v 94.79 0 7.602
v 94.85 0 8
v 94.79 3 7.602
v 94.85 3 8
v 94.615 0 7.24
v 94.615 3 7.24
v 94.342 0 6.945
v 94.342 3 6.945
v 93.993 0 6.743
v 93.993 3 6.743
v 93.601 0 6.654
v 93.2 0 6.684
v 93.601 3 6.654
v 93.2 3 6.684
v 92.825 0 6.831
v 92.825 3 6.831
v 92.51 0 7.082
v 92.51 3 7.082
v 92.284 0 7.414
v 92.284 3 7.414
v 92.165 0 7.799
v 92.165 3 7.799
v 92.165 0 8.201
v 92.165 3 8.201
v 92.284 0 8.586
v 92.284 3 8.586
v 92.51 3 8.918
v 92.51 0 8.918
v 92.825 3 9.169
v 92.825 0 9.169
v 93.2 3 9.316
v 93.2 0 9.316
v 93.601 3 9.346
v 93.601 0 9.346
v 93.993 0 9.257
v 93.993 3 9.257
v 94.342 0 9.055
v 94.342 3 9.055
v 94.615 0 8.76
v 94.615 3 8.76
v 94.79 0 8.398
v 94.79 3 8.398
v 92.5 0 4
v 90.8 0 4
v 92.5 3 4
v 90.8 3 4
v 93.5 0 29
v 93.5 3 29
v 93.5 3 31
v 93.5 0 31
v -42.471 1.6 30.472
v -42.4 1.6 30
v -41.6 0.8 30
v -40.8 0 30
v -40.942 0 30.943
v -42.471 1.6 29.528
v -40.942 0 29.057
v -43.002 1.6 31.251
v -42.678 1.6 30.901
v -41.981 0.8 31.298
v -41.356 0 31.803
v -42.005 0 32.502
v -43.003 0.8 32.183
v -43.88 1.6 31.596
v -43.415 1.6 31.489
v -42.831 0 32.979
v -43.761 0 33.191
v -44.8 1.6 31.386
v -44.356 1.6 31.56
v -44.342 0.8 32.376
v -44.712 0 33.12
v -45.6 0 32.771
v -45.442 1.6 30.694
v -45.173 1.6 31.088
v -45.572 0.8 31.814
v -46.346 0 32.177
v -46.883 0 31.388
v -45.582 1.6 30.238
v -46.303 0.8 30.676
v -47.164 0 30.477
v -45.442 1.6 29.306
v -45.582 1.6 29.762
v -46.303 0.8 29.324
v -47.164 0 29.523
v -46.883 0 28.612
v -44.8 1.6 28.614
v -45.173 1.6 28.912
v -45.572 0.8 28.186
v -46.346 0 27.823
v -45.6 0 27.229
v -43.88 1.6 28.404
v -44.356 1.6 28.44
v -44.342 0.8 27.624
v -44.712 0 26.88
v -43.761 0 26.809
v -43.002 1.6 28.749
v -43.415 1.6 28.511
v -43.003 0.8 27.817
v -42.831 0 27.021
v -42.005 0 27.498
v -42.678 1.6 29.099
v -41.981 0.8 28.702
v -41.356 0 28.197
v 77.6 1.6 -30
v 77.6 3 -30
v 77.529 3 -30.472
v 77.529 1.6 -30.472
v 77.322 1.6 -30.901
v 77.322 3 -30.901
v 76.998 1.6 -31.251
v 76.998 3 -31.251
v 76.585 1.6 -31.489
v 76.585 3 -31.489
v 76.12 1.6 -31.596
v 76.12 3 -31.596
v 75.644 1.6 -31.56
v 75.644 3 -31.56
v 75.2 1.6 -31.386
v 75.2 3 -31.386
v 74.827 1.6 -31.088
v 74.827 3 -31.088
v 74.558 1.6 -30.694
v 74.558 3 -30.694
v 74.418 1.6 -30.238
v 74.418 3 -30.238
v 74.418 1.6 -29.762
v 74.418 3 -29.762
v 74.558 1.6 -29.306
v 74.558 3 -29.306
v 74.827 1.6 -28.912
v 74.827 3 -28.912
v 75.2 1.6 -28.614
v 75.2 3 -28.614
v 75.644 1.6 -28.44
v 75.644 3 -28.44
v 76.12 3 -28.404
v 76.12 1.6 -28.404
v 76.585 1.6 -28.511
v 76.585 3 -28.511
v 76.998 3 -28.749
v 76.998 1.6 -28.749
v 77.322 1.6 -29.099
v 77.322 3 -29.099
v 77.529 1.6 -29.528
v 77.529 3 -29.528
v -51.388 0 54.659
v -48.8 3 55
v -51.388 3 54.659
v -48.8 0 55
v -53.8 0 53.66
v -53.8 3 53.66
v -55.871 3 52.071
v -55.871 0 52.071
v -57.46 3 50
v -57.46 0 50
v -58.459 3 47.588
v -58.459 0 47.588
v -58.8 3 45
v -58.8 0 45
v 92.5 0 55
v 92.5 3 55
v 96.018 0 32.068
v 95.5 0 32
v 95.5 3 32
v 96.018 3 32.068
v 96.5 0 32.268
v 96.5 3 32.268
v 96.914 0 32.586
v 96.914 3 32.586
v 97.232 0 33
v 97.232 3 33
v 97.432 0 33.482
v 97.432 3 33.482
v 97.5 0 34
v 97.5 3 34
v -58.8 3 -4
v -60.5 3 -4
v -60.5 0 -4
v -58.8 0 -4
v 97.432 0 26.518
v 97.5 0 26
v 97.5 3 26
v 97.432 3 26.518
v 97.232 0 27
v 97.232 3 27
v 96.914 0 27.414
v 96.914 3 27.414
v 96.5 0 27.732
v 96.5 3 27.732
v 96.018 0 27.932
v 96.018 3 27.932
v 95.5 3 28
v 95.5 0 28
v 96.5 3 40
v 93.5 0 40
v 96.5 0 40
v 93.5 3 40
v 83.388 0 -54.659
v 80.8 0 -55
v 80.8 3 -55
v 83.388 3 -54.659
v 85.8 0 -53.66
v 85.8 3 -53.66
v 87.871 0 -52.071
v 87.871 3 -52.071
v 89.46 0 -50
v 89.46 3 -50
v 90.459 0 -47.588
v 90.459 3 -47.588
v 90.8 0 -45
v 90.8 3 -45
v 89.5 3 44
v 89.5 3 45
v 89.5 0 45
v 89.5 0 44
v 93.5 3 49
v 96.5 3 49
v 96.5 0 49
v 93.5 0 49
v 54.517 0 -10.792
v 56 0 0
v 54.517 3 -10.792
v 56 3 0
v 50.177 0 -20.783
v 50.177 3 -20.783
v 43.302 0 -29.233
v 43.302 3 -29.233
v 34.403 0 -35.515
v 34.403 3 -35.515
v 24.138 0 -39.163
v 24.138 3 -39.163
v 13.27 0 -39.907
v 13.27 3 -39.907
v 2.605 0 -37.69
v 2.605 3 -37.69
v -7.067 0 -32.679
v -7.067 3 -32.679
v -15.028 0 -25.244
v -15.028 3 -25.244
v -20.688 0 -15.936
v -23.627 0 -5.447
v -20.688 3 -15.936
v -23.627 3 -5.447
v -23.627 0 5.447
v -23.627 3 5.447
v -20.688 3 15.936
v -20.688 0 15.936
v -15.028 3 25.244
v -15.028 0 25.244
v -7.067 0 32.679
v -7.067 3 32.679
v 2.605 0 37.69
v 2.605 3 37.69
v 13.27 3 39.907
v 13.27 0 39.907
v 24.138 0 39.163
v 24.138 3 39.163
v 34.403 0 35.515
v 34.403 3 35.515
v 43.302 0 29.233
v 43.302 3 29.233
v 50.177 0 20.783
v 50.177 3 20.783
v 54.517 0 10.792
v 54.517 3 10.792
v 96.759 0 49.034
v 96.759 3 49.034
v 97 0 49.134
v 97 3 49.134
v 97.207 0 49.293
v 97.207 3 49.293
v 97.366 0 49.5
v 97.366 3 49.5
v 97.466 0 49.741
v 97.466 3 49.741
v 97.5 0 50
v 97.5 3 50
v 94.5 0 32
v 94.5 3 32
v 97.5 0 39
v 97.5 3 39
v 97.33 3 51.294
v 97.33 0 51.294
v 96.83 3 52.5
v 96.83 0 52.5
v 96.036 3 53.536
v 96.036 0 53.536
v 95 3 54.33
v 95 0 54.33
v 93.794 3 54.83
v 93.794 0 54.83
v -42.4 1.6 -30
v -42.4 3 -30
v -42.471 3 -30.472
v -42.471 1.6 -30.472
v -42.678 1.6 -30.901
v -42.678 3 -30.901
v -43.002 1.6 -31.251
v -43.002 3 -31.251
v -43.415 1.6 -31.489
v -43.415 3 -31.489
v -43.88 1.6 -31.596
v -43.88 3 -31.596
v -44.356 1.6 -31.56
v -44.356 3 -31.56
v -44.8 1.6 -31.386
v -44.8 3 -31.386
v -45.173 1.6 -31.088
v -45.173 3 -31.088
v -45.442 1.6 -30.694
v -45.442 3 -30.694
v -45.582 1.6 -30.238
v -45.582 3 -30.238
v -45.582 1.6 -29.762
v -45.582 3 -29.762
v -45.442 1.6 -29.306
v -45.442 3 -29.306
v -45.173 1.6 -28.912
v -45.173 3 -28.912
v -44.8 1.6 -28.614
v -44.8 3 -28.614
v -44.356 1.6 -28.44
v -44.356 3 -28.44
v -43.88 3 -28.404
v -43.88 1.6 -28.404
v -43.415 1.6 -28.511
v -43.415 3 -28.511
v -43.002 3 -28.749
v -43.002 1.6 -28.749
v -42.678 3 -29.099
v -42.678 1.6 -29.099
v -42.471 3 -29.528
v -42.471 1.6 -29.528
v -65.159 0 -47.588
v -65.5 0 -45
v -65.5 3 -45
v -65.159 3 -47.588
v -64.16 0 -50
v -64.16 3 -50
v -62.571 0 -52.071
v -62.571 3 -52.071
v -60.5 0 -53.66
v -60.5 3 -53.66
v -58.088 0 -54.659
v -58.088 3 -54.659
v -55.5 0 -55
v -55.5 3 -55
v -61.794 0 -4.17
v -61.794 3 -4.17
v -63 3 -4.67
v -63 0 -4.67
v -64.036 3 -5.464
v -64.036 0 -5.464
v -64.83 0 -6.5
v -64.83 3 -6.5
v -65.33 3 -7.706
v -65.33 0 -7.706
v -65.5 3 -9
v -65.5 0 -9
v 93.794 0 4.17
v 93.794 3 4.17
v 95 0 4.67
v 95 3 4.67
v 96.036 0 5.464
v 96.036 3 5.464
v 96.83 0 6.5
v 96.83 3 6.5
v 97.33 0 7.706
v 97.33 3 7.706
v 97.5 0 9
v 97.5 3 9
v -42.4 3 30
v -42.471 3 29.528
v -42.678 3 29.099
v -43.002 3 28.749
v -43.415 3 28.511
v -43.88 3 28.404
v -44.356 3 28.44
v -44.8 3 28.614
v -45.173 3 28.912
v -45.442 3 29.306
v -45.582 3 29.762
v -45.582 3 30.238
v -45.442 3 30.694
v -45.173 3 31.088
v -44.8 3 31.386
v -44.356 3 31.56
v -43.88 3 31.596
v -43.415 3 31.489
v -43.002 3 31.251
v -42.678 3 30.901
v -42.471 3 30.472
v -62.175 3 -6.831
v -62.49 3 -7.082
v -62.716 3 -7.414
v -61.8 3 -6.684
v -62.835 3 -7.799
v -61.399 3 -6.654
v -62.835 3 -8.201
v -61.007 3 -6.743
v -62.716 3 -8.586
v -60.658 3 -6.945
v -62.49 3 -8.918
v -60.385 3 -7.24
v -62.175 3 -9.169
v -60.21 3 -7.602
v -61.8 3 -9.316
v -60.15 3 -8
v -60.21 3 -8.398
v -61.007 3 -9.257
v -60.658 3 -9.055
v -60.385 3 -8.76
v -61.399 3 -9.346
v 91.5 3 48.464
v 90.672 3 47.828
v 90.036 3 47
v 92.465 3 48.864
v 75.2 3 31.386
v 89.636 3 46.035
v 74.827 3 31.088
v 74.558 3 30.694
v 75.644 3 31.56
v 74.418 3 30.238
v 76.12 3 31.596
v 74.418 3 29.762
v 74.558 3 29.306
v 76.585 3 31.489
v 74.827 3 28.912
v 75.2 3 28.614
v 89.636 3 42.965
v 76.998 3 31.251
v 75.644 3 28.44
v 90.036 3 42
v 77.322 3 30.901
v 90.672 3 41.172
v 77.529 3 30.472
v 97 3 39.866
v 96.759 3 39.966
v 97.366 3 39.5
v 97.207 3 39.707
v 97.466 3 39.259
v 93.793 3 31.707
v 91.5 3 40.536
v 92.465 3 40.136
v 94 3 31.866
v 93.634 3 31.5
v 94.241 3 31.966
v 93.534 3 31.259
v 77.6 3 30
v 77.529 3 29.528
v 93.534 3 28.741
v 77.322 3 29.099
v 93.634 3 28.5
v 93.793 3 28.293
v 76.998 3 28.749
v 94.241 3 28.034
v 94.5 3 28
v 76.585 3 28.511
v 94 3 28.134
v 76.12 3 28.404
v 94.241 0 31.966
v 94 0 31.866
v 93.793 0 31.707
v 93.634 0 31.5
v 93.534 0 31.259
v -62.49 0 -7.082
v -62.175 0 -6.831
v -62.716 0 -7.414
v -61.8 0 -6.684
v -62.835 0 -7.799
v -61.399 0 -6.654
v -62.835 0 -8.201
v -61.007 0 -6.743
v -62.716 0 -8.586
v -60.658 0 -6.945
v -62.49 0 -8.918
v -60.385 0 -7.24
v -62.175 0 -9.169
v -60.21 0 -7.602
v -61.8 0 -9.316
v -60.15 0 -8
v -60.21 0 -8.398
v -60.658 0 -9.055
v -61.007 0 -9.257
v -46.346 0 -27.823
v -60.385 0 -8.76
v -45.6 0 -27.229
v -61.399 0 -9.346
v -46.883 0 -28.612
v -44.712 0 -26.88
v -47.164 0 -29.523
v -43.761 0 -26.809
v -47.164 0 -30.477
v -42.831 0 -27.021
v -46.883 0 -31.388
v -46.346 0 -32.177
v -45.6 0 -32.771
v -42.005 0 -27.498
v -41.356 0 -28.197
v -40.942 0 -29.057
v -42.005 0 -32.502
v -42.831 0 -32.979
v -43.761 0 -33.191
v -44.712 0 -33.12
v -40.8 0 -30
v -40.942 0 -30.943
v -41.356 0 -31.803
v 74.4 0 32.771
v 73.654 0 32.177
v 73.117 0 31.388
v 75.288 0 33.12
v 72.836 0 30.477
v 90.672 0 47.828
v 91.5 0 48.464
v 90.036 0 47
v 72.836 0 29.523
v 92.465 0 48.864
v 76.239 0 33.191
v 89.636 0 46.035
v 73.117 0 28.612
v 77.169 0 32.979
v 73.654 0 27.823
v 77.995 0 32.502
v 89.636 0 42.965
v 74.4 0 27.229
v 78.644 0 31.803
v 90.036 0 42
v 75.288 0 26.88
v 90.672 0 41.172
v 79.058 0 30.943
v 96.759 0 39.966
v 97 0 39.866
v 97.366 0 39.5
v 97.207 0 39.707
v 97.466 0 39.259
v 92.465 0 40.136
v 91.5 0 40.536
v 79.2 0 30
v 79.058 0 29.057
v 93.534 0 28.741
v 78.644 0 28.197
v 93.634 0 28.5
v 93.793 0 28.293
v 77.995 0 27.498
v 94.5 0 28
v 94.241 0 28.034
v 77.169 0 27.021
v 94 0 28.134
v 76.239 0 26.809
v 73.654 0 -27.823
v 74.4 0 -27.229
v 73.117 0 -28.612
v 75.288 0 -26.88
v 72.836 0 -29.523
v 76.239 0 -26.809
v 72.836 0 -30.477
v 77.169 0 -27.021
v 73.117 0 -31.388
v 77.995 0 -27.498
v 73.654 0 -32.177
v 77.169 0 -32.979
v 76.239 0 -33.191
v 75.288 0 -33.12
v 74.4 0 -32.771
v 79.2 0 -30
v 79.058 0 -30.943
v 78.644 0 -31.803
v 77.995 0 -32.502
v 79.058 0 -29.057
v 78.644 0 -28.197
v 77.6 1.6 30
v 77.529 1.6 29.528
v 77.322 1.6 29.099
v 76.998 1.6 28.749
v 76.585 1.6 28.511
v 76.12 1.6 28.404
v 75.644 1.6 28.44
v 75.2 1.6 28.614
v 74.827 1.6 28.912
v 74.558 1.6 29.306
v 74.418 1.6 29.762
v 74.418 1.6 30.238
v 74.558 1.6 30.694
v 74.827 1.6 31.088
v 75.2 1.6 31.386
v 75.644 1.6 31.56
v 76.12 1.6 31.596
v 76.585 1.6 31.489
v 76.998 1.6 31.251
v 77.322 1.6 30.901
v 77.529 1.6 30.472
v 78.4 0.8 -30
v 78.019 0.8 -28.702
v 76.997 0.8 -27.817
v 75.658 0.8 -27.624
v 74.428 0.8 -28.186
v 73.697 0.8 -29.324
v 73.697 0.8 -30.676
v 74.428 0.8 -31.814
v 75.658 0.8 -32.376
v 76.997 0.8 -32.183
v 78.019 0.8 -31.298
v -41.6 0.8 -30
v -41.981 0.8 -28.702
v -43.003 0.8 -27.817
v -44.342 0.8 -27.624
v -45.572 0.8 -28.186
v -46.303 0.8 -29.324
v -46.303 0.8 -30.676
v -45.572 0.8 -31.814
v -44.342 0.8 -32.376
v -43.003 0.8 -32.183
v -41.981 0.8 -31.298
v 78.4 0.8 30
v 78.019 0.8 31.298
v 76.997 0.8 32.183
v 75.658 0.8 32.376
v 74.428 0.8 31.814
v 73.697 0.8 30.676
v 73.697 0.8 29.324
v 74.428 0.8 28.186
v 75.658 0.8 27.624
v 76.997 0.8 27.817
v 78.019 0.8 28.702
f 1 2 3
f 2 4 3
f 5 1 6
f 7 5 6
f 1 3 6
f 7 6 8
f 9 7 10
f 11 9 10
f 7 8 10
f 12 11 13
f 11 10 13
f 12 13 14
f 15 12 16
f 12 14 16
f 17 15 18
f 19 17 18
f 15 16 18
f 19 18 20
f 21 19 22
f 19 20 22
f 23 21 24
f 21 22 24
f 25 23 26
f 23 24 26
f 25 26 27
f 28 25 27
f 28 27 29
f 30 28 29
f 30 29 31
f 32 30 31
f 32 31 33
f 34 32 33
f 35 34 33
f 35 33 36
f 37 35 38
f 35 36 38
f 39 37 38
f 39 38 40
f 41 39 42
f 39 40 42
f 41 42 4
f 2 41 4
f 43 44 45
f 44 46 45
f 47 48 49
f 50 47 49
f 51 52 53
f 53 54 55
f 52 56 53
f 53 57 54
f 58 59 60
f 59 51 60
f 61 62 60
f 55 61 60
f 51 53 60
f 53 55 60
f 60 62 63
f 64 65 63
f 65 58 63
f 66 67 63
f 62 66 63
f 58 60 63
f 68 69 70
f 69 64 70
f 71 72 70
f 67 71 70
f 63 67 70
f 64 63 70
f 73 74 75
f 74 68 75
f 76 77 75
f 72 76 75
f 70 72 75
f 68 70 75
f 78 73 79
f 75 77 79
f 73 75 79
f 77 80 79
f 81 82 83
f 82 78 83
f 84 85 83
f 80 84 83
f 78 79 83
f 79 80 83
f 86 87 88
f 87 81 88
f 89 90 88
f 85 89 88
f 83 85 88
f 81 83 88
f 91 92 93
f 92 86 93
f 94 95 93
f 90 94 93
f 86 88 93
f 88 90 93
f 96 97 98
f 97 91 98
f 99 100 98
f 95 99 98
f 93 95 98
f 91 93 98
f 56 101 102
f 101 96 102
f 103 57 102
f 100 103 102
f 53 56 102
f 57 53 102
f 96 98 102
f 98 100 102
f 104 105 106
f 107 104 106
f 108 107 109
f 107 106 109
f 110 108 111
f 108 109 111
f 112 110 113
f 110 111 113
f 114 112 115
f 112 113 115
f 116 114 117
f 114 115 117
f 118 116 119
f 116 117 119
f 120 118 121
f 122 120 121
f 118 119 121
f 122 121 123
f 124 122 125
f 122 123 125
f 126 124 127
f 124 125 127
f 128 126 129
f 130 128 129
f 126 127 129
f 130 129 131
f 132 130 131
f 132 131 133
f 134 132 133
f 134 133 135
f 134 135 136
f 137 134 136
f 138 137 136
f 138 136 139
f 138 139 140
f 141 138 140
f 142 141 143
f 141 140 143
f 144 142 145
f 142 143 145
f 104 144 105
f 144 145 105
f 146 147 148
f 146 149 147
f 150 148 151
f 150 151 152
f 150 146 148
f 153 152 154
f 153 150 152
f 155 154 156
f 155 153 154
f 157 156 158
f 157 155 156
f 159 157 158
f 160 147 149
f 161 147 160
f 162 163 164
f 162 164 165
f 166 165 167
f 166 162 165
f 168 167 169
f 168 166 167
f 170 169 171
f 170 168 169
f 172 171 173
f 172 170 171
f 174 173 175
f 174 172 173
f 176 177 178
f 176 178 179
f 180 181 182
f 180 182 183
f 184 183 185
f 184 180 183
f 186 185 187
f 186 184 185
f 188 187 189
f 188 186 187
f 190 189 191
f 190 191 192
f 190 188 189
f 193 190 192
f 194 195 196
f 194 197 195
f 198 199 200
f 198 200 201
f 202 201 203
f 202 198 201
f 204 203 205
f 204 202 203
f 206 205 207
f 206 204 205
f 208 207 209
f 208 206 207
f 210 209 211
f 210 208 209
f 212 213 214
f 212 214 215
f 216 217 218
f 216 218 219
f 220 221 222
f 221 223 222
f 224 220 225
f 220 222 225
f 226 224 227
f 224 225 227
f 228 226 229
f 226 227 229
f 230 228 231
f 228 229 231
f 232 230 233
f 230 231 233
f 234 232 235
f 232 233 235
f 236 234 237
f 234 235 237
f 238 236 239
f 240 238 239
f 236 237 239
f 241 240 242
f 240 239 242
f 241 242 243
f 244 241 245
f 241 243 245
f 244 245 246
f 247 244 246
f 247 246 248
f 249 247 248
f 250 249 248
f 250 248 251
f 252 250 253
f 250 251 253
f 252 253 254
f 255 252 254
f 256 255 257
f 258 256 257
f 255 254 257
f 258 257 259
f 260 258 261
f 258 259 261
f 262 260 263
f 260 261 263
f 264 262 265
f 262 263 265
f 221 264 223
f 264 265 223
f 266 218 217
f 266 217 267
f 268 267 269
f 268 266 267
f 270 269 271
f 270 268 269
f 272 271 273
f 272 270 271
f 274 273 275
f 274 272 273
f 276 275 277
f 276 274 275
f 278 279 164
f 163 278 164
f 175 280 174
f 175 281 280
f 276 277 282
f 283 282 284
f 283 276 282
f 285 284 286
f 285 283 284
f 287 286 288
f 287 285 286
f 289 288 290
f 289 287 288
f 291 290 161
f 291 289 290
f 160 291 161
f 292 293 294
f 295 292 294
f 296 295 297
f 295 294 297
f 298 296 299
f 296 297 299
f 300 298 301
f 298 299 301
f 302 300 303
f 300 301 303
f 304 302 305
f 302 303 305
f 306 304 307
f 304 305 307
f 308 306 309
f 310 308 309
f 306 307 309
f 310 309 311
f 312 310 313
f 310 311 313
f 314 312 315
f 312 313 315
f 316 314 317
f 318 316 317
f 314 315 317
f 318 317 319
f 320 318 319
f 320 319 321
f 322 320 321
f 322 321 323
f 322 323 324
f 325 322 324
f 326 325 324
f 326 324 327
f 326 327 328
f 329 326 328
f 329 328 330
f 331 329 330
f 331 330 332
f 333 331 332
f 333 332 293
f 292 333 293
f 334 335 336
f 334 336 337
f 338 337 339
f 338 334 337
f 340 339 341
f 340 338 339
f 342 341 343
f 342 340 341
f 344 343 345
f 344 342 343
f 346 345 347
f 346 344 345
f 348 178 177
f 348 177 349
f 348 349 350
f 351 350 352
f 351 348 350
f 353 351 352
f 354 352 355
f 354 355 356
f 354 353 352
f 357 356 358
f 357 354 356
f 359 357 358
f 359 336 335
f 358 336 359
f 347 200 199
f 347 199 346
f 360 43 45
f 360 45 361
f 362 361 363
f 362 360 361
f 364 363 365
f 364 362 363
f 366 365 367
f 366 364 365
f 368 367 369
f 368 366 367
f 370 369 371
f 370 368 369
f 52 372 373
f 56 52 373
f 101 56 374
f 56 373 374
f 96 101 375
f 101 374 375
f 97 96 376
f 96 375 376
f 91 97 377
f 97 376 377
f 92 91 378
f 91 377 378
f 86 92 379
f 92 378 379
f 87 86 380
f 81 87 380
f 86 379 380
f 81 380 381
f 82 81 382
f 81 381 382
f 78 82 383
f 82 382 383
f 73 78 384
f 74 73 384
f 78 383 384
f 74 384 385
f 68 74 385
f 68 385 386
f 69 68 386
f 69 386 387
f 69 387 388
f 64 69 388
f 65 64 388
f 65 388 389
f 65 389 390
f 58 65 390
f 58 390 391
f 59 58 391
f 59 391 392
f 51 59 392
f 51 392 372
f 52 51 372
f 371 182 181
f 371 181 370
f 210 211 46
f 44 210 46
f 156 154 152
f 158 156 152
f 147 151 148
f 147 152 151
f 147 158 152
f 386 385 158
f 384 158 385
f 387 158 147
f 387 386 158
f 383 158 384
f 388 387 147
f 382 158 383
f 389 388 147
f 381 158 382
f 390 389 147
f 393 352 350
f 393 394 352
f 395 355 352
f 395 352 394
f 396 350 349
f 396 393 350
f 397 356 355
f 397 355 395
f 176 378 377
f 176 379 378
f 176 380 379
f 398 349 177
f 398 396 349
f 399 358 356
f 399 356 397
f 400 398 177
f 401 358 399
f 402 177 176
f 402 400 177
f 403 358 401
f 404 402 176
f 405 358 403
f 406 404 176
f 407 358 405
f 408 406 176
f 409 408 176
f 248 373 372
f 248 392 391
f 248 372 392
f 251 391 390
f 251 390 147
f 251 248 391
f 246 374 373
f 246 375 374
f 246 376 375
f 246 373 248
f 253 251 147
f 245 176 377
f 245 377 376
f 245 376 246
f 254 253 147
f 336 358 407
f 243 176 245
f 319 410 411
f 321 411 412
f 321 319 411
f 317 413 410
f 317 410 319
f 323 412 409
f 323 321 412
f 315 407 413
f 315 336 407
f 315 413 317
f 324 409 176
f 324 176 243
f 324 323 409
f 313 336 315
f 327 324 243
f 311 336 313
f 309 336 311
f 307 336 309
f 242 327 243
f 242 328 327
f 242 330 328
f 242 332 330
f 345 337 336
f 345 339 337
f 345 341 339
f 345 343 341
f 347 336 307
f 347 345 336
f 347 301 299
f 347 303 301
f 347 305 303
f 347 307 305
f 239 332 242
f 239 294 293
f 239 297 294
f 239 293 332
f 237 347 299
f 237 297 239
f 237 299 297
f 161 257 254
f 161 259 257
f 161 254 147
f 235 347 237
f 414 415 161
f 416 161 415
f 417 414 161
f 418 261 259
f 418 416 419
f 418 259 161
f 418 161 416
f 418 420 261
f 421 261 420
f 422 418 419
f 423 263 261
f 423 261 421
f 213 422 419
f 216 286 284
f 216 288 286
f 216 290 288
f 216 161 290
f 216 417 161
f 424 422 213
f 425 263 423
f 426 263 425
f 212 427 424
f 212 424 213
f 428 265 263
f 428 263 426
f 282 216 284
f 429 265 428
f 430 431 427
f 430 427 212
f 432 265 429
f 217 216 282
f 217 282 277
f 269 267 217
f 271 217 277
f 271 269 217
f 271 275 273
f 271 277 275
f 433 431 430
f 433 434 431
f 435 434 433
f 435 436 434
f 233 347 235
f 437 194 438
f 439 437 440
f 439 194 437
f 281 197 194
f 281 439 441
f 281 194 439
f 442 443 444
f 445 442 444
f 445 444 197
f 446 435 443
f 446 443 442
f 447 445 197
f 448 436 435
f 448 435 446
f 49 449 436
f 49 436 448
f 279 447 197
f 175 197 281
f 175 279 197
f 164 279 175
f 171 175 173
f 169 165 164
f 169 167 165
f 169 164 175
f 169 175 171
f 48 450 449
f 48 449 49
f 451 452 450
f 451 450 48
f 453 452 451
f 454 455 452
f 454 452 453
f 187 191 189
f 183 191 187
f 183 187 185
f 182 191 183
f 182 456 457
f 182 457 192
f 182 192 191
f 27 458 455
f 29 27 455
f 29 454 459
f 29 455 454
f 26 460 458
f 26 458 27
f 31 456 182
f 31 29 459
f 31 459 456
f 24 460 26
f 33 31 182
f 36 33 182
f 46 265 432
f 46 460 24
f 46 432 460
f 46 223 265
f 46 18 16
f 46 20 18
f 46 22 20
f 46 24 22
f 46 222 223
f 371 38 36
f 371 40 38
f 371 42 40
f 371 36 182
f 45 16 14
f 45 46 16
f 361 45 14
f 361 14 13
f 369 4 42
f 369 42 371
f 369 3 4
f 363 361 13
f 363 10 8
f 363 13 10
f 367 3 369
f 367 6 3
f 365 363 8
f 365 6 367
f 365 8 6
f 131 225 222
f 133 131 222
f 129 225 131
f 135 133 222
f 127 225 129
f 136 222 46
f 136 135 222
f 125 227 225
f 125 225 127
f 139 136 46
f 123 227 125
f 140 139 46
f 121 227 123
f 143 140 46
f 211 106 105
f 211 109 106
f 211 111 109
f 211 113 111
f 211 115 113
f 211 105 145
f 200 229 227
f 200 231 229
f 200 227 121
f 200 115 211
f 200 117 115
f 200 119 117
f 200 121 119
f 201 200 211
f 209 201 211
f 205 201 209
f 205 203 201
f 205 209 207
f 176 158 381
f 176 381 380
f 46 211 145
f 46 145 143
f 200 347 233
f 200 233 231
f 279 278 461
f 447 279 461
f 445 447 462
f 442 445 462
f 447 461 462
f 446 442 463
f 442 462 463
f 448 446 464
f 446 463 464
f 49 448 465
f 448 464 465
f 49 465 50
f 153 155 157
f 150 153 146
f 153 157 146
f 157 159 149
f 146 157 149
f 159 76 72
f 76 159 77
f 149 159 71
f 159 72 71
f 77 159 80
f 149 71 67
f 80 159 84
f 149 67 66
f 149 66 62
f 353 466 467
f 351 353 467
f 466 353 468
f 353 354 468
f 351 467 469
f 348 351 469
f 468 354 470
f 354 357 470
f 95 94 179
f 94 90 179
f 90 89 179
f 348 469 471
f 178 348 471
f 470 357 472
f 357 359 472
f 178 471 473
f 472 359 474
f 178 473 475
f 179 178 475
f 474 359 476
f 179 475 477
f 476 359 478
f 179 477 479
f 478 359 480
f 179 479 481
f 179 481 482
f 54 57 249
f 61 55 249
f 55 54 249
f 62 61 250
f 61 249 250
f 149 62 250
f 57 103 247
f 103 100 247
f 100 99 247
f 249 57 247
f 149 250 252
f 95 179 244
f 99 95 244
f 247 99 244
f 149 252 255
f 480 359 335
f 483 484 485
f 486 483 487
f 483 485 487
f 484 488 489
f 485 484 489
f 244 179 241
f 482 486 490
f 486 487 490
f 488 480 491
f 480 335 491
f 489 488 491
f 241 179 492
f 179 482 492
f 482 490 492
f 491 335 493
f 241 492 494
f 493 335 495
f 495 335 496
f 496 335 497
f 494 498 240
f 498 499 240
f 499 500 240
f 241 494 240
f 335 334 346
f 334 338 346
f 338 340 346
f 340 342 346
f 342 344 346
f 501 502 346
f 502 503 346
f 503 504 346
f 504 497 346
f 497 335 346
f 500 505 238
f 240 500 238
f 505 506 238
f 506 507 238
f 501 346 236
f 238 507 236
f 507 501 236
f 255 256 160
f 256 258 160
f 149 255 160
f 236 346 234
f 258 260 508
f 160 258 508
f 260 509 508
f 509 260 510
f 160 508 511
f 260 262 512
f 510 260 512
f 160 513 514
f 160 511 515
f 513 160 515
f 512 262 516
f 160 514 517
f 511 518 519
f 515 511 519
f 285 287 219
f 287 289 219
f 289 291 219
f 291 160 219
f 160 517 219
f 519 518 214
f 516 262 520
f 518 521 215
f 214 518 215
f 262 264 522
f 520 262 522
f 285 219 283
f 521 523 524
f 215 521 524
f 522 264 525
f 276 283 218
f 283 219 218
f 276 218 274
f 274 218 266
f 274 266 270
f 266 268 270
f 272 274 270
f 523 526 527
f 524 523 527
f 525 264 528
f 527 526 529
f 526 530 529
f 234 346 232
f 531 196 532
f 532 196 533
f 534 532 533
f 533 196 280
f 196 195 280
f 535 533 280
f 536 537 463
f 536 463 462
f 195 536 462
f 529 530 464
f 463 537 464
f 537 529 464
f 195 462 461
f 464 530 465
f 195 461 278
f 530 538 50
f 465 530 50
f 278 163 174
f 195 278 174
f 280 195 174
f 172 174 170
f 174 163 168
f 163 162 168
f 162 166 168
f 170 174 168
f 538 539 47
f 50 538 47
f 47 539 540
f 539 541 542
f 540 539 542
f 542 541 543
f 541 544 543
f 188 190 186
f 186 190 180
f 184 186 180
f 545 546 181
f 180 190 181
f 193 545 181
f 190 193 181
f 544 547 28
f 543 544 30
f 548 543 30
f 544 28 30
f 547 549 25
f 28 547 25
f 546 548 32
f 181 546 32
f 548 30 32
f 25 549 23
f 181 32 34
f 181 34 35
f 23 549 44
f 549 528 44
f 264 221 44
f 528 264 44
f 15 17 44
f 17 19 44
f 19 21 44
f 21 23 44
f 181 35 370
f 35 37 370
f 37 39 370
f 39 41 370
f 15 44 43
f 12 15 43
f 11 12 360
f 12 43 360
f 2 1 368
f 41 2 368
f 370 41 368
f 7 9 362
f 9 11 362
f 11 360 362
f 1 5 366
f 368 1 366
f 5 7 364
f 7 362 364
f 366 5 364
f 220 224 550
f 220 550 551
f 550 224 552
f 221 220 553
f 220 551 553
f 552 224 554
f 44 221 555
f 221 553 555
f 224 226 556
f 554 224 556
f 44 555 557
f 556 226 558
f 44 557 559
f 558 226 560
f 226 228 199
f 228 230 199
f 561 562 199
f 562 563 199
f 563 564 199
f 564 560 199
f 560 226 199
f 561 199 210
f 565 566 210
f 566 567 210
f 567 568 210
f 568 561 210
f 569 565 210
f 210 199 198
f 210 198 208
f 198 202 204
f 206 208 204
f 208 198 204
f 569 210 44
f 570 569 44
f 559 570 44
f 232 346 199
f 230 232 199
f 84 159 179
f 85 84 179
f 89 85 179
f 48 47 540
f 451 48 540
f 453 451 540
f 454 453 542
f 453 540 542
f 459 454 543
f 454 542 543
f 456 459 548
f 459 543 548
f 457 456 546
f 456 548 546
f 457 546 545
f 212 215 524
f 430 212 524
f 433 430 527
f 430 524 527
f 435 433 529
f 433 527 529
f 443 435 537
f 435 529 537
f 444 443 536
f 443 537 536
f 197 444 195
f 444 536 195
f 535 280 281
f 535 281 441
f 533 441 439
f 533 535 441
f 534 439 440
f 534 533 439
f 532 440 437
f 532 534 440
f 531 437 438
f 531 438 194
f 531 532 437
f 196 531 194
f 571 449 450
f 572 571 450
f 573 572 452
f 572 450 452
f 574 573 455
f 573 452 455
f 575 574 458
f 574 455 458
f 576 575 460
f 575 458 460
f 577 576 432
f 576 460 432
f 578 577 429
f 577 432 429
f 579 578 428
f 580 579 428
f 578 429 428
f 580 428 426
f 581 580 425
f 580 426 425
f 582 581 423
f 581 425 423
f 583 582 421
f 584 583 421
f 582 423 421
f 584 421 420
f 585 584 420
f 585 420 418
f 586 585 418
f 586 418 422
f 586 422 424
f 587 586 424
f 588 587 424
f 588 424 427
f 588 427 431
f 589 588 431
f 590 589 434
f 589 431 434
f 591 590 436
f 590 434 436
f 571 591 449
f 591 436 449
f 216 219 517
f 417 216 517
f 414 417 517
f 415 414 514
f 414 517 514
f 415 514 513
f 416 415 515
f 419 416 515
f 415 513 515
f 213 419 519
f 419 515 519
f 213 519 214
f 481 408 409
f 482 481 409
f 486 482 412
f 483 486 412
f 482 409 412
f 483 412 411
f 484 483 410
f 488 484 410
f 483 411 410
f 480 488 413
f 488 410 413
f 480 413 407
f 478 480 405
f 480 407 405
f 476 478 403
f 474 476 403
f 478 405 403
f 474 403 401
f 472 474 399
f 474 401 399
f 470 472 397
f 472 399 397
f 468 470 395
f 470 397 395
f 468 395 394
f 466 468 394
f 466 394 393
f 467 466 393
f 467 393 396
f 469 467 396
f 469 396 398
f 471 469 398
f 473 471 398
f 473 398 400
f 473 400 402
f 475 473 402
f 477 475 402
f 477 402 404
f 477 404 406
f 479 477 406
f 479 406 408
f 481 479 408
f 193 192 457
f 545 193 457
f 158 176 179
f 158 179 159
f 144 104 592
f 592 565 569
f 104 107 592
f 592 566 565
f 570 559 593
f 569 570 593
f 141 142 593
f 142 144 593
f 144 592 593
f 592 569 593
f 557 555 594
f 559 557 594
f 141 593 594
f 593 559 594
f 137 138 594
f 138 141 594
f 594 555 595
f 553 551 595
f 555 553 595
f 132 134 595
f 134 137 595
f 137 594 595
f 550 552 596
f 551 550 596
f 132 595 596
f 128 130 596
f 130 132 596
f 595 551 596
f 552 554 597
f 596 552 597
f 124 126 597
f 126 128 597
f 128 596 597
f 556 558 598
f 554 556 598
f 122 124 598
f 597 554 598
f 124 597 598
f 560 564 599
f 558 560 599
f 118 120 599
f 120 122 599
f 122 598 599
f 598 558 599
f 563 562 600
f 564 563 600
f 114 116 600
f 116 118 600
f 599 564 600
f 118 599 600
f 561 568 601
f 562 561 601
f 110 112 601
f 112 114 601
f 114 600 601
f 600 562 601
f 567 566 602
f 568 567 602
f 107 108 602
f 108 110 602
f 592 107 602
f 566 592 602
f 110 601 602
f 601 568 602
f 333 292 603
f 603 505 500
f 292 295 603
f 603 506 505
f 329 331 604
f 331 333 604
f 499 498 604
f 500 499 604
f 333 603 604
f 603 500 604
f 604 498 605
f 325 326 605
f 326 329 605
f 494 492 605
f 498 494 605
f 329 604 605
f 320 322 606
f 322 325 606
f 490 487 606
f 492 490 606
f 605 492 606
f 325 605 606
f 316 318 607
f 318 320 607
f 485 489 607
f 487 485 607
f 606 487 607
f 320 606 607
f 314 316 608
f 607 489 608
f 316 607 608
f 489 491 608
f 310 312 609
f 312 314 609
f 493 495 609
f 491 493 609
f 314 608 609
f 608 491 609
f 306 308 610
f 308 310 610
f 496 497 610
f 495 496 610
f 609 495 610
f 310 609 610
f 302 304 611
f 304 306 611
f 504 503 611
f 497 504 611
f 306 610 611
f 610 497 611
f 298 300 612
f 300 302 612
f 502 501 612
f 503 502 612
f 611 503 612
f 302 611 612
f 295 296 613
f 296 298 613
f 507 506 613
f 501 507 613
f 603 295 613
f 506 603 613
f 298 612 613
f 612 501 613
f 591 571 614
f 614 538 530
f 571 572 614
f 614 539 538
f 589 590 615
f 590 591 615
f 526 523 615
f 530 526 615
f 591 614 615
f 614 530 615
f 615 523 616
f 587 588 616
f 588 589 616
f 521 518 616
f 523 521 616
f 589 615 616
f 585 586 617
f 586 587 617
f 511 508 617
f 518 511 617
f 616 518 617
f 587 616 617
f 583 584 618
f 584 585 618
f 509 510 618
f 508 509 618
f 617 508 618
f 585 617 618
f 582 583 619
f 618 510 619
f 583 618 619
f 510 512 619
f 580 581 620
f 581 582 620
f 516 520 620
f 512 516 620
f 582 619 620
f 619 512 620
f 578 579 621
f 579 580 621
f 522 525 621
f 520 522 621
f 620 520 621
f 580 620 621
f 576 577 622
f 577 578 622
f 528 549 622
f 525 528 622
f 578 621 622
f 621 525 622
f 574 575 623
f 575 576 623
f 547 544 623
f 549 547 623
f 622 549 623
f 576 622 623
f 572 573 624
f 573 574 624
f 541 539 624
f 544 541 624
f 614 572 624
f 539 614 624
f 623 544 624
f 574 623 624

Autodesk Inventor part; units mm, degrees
ref_plane "YZ Plane" through (0, 0, 0) normal (1, 0, 0) x (0, 1, 0)
ref_plane "XZ Plane" through (0, 0, 0) normal (0, 1, 0) x (-1, 0, 0)
ref_plane "XY Plane" through (0, 0, 0) normal (0, 0, 1) x (1, 0, 0)
sketch "Sketch1" plane through (0, 0, 0) normal (0, 1, 0) x (-1, 0, 0)
  circle A0 centre (0, 0) radius 40
  circle A1 centre (0, 0) radius 25
  dimension "d1" = 50
  dimension "d13" = 15
extrude "Extrusion1" add sketch "Sketch1" along normal blind 5
sketch "Sketch2" plane through (0, 5, 0) normal (0, 1, 0) x (1, 0, 0)
  circle A0 centre (-33, 0) radius 1.25
  circle A1 centre (0, 0) radius 25 projected
  circle A2 centre (0, 0) radius 33 construction
  dimension "d4" = 2.5
  dimension "d12" = 8
extrude "Extrusion2" cut sketch "Sketch2" against normal blind 10 contours A0
pattern_circular "Circular Pattern1" count 6 over 360 about axis through (0, 0, 0) along (0, 1, 0) of "Extrusion2"
sketch "Sketch3" plane through (0, 5, 0) normal (0, 1, 0) x (1, 0, 0)
  line L0 (-85, -42.5) -> (85, -42.5)
  line L1 (85, -42.5) -> (85, 42.5)
  line L2 (85, 42.5) -> (-85, 42.5)
  line L3 (-85, 42.5) -> (-85, -42.5)
  line L4 (-85, -42.5) -> (85, 42.5) construction
  line L5 (85, -42.5) -> (-85, 42.5) construction
  line L6 (34.5, 15.5) -> (65.5, 15.5) construction
  line L7 (65.5, 15.5) -> (65.5, -15.5) construction
  line L8 (65.5, -15.5) -> (34.5, -15.5) construction
  line L9 (34.5, -15.5) -> (34.5, 15.5) construction
  line L10 (34.5, 15.5) -> (65.5, -15.5) construction
  line L11 (65.5, 15.5) -> (34.5, -15.5) construction
  circle A0 centre (34.5, 15.5) radius 1.5
  circle A1 centre (65.5, 15.5) radius 1.5
  circle A2 centre (65.5, -15.5) radius 1.5
  circle A3 centre (34.5, -15.5) radius 1.5
  line L12 (0, 0) -> (50, 0) construction
  circle A4 centre (0, 0) radius 40
  circle A5 centre (0, 0) radius 40 projected
  line L13 (-50, 42.5) -> (-50, -42.5)
  circle A6 centre (50, 0) radius 12
  dimension "d14" = 85
  dimension "d15" = 170
  dimension "d16" = 31
  dimension "d17" = 31
  dimension "d18" = 3
  dimension "d19" = 3
  dimension "d20" = 3
  dimension "d21" = 3
  dimension "d22" = 50
  dimension "d23" = 35
  dimension "d26" = 24
extrude "Extrusion3" add sketch "Sketch3" against normal blind 5 contours L13 L2 L1 L0
sketch "Sketch4" plane through (0, 5, 0) normal (0, 1, 0) x (1, 0, 0)
  arc A0 (39.56, -5.9166) -> (39.56, 5.9166) centre (50, 0) ccw projected
  circle A1 centre (50, 0) radius 12
  point P0 (0, 0)
  point P1 (39.56, 5.9166)
  point P2 (39.56, -5.9166)
extrude "Extrusion4" cut sketch "Sketch4" against normal blind 5
sketch "Sketch5" plane through (0, 5, 0) normal (0, 1, 0) x (1, 0, 0)
  circle A0 centre (65.5, 15.5) radius 1.5 projected
  circle A1 centre (65.5, 15.5) radius 1.5
  line L0 (34.5, -15.5) -> (65.5, -15.5)
  line L1 (65.5, -15.5) -> (65.5, 15.5)
  line L2 (65.5, 15.5) -> (34.5, 15.5)
  line L3 (34.5, 15.5) -> (34.5, -15.5)
  circle A2 centre (50, 0) radius 12 projected
  line L4 (34.5, -15.5) -> (65.5, 15.5) construction
  line L5 (65.5, -15.5) -> (34.5, 15.5) construction
  circle A3 centre (34.5, 15.5) radius 1.5
  circle A4 centre (34.5, -15.5) radius 1.5
  point P0 (0, 0)
  dimension "d30" = 3
  dimension "d31" = 3
extrude "Extrusion5" cut sketch "Sketch5" against normal blind 5 contours A3 L3 L2 | L2 L3 A3 | A4 L3 L0 | L0 L3 A4
sketch "Sketch6" plane through (0, 5, 0) normal (0, 1, 0) x (1, 0, 0)
  line L0 (-65.5, -55) -> (97.5, -55)
  line L1 (97.5, -55) -> (97.5, 55)
  line L2 (97.5, 55) -> (-65.5, 55)
  line L3 (-65.5, 55) -> (-65.5, -55)
  line L4 (-65.5, -55) -> (97.5, 55) construction
  line L5 (97.5, -55) -> (-65.5, 55) construction
  line L6 (-65.5, 4) -> (-58.8, 4)
  line L7 (-58.8, 4) -> (-58.8, -55)
  line L8 (-58.8, -55) -> (-65.5, -55)
  line L9 (-65.5, -55) -> (-65.5, 4)
  line L10 (97.5, 55) -> (90.8, 55)
  line L11 (90.8, 55) -> (90.8, -4)
  line L12 (90.8, -4) -> (97.5, -4)
  line L13 (97.5, -4) -> (97.5, 55)
  line L14 (-50, -42.5) -> (-50, 42.5) projected
  line L15 (85, 42.5) -> (85, -42.5) projected
  line L16 (-50, 42.5) -> (85, 42.5)
  line L17 (85, 42.5) -> (85, -42.5)
  line L18 (85, -42.5) -> (-50, -42.5)
  line L19 (-50, -42.5) -> (-50, 42.5)
  point P0 (0, 0)
  point P1 (16, 0)
  dimension "d34" = 16
  dimension "d35" = 110
  dimension "d36" = 163
  dimension "d37" = 6.7
  dimension "d38" = 6.7
  dimension "d40" = 51
  dimension "d41" = 51
extrude "Extrusion6" add sketch "Sketch6" against normal blind 5 contours L7 L6 L3 L2 L11 L12 L1 L0
sketch "Sketch7" plane through (0, 5, 0) normal (0, 1, 0) x (1, 0, 0)
  line L0 (97.5, -49) -> (89.5, -49)
  line L1 (89.5, -49) -> (89.5, -40)
  line L2 (89.5, -40) -> (97.5, -40)
  line L3 (97.5, -40) -> (97.5, -49)
  line L4 (-58.8, -55) -> (97.5, -55) projected
  line L5 (97.5, -55) -> (97.5, -4) projected
  line L6 (97.5, -28) -> (93.5, -28)
  line L7 (93.5, -28) -> (93.5, -32)
  line L8 (93.5, -32) -> (97.5, -32)
  line L9 (97.5, -32) -> (97.5, -28)
  point P0 (0, 0)
  dimension "d44" = 6
  dimension "d45" = 9
  dimension "d46" = 8
  dimension "d47" = 8
  dimension "d48" = 4
  dimension "d49" = 4
extrude "Extrusion7" cut sketch "Sketch7" against normal blind 5
fillet "Fillet2" radius 2 2 edges at (97.5, 2.5, 28) (97.5, 2.5, 32)
fillet "Fillet3" radius 1 2 edges at (93.5, 2.5, 28) (93.5, 2.5, 32)
fillet "Fillet4" radius 1 2 edges at (97.5, 2.5, 49) (97.5, 2.5, 40)
fillet "Fillet5" radius 5 1 edges at (97.5, 2.5, 55)
fillet "Fillet6" radius 4 2 edges at (89.5, 2.5, 40) (89.5, 2.5, 49)
fillet "Fillet7" radius 5 2 edges at (97.5, 2.5, 4) (-65.5, 2.5, -4)
fillet "Fillet8" radius 10 3 edges at (-58.8, 2.5, 55) (90.8, 2.5, -55) (-65.5, 2.5, -55)
sketch "Sketch8" plane through (0, 5, 0) normal (0, 1, 0) x (1, 0, 0)
  circle A0 centre (-61.5, 8) radius 1.35
  circle A1 centre (93.5, -8) radius 1.35
  line L0 (-60.5, 4) -> (-58.8, 4) projected
  line L1 (-65.5, 45) -> (-65.5, 9) projected
  line L2 (92.5, -4) -> (90.8, -4) projected
  line L3 (97.5, -26) -> (97.5, -9) projected
  point P0 (0, 0)
  dimension "d59" = 4
  dimension "d60" = 4
  dimension "d61" = 2.7
  dimension "d62" = 4
  dimension "d63" = 4
  dimension "d64" = 2.7
extrude "Extrusion8" cut sketch "Sketch8" against normal blind 5
sketch "Sketch9" plane through (0, 5, 0) normal (0, 1, 0) x (1, 0, 0)
  line L0 (-48, 44) -> (76, 44)
  line L1 (76, 44) -> (76, -39)
  line L2 (76, -39) -> (-48, -39)
  line L3 (-48, -39) -> (-48, 44)
  point P0 (0, 0)
extrude "Extrusion9" add sketch "Sketch9" against normal blind 5
sketch "Sketch10" plane through (0, 5, 0) normal (0, 1, 0) x (1, 0, 0)
  circle A0 centre (16, 0) radius 40
  line L0 (-58.8, 4) -> (-58.8, -45) projected
  point P0 (0, 0)
  dimension "d69" = 80
  dimension "d70" = 74.8
extrude "Extrusion10" cut sketch "Sketch10" against normal blind 5
sketch "Sketch11" plane through (0, 5, 0) normal (0, 1, 0) x (1, 0, 0)
  line L0 (-44, -30) -> (76, -30) construction
  line L1 (76, -30) -> (76, 30) construction
  line L2 (76, 30) -> (-44, 30) construction
  line L3 (-44, 30) -> (-44, -30) construction
  circle A0 centre (16, 0) radius 40 construction
  line L4 (-44, -30) -> (76, 30) construction
  line L5 (76, -30) -> (-44, 30) construction
  circle A1 centre (76, 30) radius 1.6
  circle A2 centre (-44, 30) radius 1.6
  circle A3 centre (-44, -30) radius 1.6
  circle A4 centre (76, -30) radius 1.6
  point P0 (0, 0)
  dimension "d73" = 60
  dimension "d74" = 120
  dimension "d75" = 3.2
  dimension "d76" = 3.2
  dimension "d77" = 3.2
  dimension "d78" = 3.2
extrude "Extrusion11" cut sketch "Sketch11" against normal blind 5
sketch "Sketch12" plane through (0, 5, 0) normal (0, 1, 0) x (1, 0, 0)
  line L0 (-160, 70) -> (160, 70)
  line L1 (160, 70) -> (160, -70)
  line L2 (160, -70) -> (-160, -70)
  line L3 (-160, -70) -> (-160, 70)
  line L4 (-160, 70) -> (160, -70) construction
  line L5 (160, 70) -> (-160, -70) construction
  point P0 (0, 0)
extrude "Extrusion12" cut sketch "Sketch12" against normal blind 2
chamfer "Chamfer1" distance 1.6 angle 45 4 edges at (-45.6, 0, 30) (74.4, 0, 30) (74.4, 0, -30) (-45.6, 0, -30)
properties part number "Microscope lid"
